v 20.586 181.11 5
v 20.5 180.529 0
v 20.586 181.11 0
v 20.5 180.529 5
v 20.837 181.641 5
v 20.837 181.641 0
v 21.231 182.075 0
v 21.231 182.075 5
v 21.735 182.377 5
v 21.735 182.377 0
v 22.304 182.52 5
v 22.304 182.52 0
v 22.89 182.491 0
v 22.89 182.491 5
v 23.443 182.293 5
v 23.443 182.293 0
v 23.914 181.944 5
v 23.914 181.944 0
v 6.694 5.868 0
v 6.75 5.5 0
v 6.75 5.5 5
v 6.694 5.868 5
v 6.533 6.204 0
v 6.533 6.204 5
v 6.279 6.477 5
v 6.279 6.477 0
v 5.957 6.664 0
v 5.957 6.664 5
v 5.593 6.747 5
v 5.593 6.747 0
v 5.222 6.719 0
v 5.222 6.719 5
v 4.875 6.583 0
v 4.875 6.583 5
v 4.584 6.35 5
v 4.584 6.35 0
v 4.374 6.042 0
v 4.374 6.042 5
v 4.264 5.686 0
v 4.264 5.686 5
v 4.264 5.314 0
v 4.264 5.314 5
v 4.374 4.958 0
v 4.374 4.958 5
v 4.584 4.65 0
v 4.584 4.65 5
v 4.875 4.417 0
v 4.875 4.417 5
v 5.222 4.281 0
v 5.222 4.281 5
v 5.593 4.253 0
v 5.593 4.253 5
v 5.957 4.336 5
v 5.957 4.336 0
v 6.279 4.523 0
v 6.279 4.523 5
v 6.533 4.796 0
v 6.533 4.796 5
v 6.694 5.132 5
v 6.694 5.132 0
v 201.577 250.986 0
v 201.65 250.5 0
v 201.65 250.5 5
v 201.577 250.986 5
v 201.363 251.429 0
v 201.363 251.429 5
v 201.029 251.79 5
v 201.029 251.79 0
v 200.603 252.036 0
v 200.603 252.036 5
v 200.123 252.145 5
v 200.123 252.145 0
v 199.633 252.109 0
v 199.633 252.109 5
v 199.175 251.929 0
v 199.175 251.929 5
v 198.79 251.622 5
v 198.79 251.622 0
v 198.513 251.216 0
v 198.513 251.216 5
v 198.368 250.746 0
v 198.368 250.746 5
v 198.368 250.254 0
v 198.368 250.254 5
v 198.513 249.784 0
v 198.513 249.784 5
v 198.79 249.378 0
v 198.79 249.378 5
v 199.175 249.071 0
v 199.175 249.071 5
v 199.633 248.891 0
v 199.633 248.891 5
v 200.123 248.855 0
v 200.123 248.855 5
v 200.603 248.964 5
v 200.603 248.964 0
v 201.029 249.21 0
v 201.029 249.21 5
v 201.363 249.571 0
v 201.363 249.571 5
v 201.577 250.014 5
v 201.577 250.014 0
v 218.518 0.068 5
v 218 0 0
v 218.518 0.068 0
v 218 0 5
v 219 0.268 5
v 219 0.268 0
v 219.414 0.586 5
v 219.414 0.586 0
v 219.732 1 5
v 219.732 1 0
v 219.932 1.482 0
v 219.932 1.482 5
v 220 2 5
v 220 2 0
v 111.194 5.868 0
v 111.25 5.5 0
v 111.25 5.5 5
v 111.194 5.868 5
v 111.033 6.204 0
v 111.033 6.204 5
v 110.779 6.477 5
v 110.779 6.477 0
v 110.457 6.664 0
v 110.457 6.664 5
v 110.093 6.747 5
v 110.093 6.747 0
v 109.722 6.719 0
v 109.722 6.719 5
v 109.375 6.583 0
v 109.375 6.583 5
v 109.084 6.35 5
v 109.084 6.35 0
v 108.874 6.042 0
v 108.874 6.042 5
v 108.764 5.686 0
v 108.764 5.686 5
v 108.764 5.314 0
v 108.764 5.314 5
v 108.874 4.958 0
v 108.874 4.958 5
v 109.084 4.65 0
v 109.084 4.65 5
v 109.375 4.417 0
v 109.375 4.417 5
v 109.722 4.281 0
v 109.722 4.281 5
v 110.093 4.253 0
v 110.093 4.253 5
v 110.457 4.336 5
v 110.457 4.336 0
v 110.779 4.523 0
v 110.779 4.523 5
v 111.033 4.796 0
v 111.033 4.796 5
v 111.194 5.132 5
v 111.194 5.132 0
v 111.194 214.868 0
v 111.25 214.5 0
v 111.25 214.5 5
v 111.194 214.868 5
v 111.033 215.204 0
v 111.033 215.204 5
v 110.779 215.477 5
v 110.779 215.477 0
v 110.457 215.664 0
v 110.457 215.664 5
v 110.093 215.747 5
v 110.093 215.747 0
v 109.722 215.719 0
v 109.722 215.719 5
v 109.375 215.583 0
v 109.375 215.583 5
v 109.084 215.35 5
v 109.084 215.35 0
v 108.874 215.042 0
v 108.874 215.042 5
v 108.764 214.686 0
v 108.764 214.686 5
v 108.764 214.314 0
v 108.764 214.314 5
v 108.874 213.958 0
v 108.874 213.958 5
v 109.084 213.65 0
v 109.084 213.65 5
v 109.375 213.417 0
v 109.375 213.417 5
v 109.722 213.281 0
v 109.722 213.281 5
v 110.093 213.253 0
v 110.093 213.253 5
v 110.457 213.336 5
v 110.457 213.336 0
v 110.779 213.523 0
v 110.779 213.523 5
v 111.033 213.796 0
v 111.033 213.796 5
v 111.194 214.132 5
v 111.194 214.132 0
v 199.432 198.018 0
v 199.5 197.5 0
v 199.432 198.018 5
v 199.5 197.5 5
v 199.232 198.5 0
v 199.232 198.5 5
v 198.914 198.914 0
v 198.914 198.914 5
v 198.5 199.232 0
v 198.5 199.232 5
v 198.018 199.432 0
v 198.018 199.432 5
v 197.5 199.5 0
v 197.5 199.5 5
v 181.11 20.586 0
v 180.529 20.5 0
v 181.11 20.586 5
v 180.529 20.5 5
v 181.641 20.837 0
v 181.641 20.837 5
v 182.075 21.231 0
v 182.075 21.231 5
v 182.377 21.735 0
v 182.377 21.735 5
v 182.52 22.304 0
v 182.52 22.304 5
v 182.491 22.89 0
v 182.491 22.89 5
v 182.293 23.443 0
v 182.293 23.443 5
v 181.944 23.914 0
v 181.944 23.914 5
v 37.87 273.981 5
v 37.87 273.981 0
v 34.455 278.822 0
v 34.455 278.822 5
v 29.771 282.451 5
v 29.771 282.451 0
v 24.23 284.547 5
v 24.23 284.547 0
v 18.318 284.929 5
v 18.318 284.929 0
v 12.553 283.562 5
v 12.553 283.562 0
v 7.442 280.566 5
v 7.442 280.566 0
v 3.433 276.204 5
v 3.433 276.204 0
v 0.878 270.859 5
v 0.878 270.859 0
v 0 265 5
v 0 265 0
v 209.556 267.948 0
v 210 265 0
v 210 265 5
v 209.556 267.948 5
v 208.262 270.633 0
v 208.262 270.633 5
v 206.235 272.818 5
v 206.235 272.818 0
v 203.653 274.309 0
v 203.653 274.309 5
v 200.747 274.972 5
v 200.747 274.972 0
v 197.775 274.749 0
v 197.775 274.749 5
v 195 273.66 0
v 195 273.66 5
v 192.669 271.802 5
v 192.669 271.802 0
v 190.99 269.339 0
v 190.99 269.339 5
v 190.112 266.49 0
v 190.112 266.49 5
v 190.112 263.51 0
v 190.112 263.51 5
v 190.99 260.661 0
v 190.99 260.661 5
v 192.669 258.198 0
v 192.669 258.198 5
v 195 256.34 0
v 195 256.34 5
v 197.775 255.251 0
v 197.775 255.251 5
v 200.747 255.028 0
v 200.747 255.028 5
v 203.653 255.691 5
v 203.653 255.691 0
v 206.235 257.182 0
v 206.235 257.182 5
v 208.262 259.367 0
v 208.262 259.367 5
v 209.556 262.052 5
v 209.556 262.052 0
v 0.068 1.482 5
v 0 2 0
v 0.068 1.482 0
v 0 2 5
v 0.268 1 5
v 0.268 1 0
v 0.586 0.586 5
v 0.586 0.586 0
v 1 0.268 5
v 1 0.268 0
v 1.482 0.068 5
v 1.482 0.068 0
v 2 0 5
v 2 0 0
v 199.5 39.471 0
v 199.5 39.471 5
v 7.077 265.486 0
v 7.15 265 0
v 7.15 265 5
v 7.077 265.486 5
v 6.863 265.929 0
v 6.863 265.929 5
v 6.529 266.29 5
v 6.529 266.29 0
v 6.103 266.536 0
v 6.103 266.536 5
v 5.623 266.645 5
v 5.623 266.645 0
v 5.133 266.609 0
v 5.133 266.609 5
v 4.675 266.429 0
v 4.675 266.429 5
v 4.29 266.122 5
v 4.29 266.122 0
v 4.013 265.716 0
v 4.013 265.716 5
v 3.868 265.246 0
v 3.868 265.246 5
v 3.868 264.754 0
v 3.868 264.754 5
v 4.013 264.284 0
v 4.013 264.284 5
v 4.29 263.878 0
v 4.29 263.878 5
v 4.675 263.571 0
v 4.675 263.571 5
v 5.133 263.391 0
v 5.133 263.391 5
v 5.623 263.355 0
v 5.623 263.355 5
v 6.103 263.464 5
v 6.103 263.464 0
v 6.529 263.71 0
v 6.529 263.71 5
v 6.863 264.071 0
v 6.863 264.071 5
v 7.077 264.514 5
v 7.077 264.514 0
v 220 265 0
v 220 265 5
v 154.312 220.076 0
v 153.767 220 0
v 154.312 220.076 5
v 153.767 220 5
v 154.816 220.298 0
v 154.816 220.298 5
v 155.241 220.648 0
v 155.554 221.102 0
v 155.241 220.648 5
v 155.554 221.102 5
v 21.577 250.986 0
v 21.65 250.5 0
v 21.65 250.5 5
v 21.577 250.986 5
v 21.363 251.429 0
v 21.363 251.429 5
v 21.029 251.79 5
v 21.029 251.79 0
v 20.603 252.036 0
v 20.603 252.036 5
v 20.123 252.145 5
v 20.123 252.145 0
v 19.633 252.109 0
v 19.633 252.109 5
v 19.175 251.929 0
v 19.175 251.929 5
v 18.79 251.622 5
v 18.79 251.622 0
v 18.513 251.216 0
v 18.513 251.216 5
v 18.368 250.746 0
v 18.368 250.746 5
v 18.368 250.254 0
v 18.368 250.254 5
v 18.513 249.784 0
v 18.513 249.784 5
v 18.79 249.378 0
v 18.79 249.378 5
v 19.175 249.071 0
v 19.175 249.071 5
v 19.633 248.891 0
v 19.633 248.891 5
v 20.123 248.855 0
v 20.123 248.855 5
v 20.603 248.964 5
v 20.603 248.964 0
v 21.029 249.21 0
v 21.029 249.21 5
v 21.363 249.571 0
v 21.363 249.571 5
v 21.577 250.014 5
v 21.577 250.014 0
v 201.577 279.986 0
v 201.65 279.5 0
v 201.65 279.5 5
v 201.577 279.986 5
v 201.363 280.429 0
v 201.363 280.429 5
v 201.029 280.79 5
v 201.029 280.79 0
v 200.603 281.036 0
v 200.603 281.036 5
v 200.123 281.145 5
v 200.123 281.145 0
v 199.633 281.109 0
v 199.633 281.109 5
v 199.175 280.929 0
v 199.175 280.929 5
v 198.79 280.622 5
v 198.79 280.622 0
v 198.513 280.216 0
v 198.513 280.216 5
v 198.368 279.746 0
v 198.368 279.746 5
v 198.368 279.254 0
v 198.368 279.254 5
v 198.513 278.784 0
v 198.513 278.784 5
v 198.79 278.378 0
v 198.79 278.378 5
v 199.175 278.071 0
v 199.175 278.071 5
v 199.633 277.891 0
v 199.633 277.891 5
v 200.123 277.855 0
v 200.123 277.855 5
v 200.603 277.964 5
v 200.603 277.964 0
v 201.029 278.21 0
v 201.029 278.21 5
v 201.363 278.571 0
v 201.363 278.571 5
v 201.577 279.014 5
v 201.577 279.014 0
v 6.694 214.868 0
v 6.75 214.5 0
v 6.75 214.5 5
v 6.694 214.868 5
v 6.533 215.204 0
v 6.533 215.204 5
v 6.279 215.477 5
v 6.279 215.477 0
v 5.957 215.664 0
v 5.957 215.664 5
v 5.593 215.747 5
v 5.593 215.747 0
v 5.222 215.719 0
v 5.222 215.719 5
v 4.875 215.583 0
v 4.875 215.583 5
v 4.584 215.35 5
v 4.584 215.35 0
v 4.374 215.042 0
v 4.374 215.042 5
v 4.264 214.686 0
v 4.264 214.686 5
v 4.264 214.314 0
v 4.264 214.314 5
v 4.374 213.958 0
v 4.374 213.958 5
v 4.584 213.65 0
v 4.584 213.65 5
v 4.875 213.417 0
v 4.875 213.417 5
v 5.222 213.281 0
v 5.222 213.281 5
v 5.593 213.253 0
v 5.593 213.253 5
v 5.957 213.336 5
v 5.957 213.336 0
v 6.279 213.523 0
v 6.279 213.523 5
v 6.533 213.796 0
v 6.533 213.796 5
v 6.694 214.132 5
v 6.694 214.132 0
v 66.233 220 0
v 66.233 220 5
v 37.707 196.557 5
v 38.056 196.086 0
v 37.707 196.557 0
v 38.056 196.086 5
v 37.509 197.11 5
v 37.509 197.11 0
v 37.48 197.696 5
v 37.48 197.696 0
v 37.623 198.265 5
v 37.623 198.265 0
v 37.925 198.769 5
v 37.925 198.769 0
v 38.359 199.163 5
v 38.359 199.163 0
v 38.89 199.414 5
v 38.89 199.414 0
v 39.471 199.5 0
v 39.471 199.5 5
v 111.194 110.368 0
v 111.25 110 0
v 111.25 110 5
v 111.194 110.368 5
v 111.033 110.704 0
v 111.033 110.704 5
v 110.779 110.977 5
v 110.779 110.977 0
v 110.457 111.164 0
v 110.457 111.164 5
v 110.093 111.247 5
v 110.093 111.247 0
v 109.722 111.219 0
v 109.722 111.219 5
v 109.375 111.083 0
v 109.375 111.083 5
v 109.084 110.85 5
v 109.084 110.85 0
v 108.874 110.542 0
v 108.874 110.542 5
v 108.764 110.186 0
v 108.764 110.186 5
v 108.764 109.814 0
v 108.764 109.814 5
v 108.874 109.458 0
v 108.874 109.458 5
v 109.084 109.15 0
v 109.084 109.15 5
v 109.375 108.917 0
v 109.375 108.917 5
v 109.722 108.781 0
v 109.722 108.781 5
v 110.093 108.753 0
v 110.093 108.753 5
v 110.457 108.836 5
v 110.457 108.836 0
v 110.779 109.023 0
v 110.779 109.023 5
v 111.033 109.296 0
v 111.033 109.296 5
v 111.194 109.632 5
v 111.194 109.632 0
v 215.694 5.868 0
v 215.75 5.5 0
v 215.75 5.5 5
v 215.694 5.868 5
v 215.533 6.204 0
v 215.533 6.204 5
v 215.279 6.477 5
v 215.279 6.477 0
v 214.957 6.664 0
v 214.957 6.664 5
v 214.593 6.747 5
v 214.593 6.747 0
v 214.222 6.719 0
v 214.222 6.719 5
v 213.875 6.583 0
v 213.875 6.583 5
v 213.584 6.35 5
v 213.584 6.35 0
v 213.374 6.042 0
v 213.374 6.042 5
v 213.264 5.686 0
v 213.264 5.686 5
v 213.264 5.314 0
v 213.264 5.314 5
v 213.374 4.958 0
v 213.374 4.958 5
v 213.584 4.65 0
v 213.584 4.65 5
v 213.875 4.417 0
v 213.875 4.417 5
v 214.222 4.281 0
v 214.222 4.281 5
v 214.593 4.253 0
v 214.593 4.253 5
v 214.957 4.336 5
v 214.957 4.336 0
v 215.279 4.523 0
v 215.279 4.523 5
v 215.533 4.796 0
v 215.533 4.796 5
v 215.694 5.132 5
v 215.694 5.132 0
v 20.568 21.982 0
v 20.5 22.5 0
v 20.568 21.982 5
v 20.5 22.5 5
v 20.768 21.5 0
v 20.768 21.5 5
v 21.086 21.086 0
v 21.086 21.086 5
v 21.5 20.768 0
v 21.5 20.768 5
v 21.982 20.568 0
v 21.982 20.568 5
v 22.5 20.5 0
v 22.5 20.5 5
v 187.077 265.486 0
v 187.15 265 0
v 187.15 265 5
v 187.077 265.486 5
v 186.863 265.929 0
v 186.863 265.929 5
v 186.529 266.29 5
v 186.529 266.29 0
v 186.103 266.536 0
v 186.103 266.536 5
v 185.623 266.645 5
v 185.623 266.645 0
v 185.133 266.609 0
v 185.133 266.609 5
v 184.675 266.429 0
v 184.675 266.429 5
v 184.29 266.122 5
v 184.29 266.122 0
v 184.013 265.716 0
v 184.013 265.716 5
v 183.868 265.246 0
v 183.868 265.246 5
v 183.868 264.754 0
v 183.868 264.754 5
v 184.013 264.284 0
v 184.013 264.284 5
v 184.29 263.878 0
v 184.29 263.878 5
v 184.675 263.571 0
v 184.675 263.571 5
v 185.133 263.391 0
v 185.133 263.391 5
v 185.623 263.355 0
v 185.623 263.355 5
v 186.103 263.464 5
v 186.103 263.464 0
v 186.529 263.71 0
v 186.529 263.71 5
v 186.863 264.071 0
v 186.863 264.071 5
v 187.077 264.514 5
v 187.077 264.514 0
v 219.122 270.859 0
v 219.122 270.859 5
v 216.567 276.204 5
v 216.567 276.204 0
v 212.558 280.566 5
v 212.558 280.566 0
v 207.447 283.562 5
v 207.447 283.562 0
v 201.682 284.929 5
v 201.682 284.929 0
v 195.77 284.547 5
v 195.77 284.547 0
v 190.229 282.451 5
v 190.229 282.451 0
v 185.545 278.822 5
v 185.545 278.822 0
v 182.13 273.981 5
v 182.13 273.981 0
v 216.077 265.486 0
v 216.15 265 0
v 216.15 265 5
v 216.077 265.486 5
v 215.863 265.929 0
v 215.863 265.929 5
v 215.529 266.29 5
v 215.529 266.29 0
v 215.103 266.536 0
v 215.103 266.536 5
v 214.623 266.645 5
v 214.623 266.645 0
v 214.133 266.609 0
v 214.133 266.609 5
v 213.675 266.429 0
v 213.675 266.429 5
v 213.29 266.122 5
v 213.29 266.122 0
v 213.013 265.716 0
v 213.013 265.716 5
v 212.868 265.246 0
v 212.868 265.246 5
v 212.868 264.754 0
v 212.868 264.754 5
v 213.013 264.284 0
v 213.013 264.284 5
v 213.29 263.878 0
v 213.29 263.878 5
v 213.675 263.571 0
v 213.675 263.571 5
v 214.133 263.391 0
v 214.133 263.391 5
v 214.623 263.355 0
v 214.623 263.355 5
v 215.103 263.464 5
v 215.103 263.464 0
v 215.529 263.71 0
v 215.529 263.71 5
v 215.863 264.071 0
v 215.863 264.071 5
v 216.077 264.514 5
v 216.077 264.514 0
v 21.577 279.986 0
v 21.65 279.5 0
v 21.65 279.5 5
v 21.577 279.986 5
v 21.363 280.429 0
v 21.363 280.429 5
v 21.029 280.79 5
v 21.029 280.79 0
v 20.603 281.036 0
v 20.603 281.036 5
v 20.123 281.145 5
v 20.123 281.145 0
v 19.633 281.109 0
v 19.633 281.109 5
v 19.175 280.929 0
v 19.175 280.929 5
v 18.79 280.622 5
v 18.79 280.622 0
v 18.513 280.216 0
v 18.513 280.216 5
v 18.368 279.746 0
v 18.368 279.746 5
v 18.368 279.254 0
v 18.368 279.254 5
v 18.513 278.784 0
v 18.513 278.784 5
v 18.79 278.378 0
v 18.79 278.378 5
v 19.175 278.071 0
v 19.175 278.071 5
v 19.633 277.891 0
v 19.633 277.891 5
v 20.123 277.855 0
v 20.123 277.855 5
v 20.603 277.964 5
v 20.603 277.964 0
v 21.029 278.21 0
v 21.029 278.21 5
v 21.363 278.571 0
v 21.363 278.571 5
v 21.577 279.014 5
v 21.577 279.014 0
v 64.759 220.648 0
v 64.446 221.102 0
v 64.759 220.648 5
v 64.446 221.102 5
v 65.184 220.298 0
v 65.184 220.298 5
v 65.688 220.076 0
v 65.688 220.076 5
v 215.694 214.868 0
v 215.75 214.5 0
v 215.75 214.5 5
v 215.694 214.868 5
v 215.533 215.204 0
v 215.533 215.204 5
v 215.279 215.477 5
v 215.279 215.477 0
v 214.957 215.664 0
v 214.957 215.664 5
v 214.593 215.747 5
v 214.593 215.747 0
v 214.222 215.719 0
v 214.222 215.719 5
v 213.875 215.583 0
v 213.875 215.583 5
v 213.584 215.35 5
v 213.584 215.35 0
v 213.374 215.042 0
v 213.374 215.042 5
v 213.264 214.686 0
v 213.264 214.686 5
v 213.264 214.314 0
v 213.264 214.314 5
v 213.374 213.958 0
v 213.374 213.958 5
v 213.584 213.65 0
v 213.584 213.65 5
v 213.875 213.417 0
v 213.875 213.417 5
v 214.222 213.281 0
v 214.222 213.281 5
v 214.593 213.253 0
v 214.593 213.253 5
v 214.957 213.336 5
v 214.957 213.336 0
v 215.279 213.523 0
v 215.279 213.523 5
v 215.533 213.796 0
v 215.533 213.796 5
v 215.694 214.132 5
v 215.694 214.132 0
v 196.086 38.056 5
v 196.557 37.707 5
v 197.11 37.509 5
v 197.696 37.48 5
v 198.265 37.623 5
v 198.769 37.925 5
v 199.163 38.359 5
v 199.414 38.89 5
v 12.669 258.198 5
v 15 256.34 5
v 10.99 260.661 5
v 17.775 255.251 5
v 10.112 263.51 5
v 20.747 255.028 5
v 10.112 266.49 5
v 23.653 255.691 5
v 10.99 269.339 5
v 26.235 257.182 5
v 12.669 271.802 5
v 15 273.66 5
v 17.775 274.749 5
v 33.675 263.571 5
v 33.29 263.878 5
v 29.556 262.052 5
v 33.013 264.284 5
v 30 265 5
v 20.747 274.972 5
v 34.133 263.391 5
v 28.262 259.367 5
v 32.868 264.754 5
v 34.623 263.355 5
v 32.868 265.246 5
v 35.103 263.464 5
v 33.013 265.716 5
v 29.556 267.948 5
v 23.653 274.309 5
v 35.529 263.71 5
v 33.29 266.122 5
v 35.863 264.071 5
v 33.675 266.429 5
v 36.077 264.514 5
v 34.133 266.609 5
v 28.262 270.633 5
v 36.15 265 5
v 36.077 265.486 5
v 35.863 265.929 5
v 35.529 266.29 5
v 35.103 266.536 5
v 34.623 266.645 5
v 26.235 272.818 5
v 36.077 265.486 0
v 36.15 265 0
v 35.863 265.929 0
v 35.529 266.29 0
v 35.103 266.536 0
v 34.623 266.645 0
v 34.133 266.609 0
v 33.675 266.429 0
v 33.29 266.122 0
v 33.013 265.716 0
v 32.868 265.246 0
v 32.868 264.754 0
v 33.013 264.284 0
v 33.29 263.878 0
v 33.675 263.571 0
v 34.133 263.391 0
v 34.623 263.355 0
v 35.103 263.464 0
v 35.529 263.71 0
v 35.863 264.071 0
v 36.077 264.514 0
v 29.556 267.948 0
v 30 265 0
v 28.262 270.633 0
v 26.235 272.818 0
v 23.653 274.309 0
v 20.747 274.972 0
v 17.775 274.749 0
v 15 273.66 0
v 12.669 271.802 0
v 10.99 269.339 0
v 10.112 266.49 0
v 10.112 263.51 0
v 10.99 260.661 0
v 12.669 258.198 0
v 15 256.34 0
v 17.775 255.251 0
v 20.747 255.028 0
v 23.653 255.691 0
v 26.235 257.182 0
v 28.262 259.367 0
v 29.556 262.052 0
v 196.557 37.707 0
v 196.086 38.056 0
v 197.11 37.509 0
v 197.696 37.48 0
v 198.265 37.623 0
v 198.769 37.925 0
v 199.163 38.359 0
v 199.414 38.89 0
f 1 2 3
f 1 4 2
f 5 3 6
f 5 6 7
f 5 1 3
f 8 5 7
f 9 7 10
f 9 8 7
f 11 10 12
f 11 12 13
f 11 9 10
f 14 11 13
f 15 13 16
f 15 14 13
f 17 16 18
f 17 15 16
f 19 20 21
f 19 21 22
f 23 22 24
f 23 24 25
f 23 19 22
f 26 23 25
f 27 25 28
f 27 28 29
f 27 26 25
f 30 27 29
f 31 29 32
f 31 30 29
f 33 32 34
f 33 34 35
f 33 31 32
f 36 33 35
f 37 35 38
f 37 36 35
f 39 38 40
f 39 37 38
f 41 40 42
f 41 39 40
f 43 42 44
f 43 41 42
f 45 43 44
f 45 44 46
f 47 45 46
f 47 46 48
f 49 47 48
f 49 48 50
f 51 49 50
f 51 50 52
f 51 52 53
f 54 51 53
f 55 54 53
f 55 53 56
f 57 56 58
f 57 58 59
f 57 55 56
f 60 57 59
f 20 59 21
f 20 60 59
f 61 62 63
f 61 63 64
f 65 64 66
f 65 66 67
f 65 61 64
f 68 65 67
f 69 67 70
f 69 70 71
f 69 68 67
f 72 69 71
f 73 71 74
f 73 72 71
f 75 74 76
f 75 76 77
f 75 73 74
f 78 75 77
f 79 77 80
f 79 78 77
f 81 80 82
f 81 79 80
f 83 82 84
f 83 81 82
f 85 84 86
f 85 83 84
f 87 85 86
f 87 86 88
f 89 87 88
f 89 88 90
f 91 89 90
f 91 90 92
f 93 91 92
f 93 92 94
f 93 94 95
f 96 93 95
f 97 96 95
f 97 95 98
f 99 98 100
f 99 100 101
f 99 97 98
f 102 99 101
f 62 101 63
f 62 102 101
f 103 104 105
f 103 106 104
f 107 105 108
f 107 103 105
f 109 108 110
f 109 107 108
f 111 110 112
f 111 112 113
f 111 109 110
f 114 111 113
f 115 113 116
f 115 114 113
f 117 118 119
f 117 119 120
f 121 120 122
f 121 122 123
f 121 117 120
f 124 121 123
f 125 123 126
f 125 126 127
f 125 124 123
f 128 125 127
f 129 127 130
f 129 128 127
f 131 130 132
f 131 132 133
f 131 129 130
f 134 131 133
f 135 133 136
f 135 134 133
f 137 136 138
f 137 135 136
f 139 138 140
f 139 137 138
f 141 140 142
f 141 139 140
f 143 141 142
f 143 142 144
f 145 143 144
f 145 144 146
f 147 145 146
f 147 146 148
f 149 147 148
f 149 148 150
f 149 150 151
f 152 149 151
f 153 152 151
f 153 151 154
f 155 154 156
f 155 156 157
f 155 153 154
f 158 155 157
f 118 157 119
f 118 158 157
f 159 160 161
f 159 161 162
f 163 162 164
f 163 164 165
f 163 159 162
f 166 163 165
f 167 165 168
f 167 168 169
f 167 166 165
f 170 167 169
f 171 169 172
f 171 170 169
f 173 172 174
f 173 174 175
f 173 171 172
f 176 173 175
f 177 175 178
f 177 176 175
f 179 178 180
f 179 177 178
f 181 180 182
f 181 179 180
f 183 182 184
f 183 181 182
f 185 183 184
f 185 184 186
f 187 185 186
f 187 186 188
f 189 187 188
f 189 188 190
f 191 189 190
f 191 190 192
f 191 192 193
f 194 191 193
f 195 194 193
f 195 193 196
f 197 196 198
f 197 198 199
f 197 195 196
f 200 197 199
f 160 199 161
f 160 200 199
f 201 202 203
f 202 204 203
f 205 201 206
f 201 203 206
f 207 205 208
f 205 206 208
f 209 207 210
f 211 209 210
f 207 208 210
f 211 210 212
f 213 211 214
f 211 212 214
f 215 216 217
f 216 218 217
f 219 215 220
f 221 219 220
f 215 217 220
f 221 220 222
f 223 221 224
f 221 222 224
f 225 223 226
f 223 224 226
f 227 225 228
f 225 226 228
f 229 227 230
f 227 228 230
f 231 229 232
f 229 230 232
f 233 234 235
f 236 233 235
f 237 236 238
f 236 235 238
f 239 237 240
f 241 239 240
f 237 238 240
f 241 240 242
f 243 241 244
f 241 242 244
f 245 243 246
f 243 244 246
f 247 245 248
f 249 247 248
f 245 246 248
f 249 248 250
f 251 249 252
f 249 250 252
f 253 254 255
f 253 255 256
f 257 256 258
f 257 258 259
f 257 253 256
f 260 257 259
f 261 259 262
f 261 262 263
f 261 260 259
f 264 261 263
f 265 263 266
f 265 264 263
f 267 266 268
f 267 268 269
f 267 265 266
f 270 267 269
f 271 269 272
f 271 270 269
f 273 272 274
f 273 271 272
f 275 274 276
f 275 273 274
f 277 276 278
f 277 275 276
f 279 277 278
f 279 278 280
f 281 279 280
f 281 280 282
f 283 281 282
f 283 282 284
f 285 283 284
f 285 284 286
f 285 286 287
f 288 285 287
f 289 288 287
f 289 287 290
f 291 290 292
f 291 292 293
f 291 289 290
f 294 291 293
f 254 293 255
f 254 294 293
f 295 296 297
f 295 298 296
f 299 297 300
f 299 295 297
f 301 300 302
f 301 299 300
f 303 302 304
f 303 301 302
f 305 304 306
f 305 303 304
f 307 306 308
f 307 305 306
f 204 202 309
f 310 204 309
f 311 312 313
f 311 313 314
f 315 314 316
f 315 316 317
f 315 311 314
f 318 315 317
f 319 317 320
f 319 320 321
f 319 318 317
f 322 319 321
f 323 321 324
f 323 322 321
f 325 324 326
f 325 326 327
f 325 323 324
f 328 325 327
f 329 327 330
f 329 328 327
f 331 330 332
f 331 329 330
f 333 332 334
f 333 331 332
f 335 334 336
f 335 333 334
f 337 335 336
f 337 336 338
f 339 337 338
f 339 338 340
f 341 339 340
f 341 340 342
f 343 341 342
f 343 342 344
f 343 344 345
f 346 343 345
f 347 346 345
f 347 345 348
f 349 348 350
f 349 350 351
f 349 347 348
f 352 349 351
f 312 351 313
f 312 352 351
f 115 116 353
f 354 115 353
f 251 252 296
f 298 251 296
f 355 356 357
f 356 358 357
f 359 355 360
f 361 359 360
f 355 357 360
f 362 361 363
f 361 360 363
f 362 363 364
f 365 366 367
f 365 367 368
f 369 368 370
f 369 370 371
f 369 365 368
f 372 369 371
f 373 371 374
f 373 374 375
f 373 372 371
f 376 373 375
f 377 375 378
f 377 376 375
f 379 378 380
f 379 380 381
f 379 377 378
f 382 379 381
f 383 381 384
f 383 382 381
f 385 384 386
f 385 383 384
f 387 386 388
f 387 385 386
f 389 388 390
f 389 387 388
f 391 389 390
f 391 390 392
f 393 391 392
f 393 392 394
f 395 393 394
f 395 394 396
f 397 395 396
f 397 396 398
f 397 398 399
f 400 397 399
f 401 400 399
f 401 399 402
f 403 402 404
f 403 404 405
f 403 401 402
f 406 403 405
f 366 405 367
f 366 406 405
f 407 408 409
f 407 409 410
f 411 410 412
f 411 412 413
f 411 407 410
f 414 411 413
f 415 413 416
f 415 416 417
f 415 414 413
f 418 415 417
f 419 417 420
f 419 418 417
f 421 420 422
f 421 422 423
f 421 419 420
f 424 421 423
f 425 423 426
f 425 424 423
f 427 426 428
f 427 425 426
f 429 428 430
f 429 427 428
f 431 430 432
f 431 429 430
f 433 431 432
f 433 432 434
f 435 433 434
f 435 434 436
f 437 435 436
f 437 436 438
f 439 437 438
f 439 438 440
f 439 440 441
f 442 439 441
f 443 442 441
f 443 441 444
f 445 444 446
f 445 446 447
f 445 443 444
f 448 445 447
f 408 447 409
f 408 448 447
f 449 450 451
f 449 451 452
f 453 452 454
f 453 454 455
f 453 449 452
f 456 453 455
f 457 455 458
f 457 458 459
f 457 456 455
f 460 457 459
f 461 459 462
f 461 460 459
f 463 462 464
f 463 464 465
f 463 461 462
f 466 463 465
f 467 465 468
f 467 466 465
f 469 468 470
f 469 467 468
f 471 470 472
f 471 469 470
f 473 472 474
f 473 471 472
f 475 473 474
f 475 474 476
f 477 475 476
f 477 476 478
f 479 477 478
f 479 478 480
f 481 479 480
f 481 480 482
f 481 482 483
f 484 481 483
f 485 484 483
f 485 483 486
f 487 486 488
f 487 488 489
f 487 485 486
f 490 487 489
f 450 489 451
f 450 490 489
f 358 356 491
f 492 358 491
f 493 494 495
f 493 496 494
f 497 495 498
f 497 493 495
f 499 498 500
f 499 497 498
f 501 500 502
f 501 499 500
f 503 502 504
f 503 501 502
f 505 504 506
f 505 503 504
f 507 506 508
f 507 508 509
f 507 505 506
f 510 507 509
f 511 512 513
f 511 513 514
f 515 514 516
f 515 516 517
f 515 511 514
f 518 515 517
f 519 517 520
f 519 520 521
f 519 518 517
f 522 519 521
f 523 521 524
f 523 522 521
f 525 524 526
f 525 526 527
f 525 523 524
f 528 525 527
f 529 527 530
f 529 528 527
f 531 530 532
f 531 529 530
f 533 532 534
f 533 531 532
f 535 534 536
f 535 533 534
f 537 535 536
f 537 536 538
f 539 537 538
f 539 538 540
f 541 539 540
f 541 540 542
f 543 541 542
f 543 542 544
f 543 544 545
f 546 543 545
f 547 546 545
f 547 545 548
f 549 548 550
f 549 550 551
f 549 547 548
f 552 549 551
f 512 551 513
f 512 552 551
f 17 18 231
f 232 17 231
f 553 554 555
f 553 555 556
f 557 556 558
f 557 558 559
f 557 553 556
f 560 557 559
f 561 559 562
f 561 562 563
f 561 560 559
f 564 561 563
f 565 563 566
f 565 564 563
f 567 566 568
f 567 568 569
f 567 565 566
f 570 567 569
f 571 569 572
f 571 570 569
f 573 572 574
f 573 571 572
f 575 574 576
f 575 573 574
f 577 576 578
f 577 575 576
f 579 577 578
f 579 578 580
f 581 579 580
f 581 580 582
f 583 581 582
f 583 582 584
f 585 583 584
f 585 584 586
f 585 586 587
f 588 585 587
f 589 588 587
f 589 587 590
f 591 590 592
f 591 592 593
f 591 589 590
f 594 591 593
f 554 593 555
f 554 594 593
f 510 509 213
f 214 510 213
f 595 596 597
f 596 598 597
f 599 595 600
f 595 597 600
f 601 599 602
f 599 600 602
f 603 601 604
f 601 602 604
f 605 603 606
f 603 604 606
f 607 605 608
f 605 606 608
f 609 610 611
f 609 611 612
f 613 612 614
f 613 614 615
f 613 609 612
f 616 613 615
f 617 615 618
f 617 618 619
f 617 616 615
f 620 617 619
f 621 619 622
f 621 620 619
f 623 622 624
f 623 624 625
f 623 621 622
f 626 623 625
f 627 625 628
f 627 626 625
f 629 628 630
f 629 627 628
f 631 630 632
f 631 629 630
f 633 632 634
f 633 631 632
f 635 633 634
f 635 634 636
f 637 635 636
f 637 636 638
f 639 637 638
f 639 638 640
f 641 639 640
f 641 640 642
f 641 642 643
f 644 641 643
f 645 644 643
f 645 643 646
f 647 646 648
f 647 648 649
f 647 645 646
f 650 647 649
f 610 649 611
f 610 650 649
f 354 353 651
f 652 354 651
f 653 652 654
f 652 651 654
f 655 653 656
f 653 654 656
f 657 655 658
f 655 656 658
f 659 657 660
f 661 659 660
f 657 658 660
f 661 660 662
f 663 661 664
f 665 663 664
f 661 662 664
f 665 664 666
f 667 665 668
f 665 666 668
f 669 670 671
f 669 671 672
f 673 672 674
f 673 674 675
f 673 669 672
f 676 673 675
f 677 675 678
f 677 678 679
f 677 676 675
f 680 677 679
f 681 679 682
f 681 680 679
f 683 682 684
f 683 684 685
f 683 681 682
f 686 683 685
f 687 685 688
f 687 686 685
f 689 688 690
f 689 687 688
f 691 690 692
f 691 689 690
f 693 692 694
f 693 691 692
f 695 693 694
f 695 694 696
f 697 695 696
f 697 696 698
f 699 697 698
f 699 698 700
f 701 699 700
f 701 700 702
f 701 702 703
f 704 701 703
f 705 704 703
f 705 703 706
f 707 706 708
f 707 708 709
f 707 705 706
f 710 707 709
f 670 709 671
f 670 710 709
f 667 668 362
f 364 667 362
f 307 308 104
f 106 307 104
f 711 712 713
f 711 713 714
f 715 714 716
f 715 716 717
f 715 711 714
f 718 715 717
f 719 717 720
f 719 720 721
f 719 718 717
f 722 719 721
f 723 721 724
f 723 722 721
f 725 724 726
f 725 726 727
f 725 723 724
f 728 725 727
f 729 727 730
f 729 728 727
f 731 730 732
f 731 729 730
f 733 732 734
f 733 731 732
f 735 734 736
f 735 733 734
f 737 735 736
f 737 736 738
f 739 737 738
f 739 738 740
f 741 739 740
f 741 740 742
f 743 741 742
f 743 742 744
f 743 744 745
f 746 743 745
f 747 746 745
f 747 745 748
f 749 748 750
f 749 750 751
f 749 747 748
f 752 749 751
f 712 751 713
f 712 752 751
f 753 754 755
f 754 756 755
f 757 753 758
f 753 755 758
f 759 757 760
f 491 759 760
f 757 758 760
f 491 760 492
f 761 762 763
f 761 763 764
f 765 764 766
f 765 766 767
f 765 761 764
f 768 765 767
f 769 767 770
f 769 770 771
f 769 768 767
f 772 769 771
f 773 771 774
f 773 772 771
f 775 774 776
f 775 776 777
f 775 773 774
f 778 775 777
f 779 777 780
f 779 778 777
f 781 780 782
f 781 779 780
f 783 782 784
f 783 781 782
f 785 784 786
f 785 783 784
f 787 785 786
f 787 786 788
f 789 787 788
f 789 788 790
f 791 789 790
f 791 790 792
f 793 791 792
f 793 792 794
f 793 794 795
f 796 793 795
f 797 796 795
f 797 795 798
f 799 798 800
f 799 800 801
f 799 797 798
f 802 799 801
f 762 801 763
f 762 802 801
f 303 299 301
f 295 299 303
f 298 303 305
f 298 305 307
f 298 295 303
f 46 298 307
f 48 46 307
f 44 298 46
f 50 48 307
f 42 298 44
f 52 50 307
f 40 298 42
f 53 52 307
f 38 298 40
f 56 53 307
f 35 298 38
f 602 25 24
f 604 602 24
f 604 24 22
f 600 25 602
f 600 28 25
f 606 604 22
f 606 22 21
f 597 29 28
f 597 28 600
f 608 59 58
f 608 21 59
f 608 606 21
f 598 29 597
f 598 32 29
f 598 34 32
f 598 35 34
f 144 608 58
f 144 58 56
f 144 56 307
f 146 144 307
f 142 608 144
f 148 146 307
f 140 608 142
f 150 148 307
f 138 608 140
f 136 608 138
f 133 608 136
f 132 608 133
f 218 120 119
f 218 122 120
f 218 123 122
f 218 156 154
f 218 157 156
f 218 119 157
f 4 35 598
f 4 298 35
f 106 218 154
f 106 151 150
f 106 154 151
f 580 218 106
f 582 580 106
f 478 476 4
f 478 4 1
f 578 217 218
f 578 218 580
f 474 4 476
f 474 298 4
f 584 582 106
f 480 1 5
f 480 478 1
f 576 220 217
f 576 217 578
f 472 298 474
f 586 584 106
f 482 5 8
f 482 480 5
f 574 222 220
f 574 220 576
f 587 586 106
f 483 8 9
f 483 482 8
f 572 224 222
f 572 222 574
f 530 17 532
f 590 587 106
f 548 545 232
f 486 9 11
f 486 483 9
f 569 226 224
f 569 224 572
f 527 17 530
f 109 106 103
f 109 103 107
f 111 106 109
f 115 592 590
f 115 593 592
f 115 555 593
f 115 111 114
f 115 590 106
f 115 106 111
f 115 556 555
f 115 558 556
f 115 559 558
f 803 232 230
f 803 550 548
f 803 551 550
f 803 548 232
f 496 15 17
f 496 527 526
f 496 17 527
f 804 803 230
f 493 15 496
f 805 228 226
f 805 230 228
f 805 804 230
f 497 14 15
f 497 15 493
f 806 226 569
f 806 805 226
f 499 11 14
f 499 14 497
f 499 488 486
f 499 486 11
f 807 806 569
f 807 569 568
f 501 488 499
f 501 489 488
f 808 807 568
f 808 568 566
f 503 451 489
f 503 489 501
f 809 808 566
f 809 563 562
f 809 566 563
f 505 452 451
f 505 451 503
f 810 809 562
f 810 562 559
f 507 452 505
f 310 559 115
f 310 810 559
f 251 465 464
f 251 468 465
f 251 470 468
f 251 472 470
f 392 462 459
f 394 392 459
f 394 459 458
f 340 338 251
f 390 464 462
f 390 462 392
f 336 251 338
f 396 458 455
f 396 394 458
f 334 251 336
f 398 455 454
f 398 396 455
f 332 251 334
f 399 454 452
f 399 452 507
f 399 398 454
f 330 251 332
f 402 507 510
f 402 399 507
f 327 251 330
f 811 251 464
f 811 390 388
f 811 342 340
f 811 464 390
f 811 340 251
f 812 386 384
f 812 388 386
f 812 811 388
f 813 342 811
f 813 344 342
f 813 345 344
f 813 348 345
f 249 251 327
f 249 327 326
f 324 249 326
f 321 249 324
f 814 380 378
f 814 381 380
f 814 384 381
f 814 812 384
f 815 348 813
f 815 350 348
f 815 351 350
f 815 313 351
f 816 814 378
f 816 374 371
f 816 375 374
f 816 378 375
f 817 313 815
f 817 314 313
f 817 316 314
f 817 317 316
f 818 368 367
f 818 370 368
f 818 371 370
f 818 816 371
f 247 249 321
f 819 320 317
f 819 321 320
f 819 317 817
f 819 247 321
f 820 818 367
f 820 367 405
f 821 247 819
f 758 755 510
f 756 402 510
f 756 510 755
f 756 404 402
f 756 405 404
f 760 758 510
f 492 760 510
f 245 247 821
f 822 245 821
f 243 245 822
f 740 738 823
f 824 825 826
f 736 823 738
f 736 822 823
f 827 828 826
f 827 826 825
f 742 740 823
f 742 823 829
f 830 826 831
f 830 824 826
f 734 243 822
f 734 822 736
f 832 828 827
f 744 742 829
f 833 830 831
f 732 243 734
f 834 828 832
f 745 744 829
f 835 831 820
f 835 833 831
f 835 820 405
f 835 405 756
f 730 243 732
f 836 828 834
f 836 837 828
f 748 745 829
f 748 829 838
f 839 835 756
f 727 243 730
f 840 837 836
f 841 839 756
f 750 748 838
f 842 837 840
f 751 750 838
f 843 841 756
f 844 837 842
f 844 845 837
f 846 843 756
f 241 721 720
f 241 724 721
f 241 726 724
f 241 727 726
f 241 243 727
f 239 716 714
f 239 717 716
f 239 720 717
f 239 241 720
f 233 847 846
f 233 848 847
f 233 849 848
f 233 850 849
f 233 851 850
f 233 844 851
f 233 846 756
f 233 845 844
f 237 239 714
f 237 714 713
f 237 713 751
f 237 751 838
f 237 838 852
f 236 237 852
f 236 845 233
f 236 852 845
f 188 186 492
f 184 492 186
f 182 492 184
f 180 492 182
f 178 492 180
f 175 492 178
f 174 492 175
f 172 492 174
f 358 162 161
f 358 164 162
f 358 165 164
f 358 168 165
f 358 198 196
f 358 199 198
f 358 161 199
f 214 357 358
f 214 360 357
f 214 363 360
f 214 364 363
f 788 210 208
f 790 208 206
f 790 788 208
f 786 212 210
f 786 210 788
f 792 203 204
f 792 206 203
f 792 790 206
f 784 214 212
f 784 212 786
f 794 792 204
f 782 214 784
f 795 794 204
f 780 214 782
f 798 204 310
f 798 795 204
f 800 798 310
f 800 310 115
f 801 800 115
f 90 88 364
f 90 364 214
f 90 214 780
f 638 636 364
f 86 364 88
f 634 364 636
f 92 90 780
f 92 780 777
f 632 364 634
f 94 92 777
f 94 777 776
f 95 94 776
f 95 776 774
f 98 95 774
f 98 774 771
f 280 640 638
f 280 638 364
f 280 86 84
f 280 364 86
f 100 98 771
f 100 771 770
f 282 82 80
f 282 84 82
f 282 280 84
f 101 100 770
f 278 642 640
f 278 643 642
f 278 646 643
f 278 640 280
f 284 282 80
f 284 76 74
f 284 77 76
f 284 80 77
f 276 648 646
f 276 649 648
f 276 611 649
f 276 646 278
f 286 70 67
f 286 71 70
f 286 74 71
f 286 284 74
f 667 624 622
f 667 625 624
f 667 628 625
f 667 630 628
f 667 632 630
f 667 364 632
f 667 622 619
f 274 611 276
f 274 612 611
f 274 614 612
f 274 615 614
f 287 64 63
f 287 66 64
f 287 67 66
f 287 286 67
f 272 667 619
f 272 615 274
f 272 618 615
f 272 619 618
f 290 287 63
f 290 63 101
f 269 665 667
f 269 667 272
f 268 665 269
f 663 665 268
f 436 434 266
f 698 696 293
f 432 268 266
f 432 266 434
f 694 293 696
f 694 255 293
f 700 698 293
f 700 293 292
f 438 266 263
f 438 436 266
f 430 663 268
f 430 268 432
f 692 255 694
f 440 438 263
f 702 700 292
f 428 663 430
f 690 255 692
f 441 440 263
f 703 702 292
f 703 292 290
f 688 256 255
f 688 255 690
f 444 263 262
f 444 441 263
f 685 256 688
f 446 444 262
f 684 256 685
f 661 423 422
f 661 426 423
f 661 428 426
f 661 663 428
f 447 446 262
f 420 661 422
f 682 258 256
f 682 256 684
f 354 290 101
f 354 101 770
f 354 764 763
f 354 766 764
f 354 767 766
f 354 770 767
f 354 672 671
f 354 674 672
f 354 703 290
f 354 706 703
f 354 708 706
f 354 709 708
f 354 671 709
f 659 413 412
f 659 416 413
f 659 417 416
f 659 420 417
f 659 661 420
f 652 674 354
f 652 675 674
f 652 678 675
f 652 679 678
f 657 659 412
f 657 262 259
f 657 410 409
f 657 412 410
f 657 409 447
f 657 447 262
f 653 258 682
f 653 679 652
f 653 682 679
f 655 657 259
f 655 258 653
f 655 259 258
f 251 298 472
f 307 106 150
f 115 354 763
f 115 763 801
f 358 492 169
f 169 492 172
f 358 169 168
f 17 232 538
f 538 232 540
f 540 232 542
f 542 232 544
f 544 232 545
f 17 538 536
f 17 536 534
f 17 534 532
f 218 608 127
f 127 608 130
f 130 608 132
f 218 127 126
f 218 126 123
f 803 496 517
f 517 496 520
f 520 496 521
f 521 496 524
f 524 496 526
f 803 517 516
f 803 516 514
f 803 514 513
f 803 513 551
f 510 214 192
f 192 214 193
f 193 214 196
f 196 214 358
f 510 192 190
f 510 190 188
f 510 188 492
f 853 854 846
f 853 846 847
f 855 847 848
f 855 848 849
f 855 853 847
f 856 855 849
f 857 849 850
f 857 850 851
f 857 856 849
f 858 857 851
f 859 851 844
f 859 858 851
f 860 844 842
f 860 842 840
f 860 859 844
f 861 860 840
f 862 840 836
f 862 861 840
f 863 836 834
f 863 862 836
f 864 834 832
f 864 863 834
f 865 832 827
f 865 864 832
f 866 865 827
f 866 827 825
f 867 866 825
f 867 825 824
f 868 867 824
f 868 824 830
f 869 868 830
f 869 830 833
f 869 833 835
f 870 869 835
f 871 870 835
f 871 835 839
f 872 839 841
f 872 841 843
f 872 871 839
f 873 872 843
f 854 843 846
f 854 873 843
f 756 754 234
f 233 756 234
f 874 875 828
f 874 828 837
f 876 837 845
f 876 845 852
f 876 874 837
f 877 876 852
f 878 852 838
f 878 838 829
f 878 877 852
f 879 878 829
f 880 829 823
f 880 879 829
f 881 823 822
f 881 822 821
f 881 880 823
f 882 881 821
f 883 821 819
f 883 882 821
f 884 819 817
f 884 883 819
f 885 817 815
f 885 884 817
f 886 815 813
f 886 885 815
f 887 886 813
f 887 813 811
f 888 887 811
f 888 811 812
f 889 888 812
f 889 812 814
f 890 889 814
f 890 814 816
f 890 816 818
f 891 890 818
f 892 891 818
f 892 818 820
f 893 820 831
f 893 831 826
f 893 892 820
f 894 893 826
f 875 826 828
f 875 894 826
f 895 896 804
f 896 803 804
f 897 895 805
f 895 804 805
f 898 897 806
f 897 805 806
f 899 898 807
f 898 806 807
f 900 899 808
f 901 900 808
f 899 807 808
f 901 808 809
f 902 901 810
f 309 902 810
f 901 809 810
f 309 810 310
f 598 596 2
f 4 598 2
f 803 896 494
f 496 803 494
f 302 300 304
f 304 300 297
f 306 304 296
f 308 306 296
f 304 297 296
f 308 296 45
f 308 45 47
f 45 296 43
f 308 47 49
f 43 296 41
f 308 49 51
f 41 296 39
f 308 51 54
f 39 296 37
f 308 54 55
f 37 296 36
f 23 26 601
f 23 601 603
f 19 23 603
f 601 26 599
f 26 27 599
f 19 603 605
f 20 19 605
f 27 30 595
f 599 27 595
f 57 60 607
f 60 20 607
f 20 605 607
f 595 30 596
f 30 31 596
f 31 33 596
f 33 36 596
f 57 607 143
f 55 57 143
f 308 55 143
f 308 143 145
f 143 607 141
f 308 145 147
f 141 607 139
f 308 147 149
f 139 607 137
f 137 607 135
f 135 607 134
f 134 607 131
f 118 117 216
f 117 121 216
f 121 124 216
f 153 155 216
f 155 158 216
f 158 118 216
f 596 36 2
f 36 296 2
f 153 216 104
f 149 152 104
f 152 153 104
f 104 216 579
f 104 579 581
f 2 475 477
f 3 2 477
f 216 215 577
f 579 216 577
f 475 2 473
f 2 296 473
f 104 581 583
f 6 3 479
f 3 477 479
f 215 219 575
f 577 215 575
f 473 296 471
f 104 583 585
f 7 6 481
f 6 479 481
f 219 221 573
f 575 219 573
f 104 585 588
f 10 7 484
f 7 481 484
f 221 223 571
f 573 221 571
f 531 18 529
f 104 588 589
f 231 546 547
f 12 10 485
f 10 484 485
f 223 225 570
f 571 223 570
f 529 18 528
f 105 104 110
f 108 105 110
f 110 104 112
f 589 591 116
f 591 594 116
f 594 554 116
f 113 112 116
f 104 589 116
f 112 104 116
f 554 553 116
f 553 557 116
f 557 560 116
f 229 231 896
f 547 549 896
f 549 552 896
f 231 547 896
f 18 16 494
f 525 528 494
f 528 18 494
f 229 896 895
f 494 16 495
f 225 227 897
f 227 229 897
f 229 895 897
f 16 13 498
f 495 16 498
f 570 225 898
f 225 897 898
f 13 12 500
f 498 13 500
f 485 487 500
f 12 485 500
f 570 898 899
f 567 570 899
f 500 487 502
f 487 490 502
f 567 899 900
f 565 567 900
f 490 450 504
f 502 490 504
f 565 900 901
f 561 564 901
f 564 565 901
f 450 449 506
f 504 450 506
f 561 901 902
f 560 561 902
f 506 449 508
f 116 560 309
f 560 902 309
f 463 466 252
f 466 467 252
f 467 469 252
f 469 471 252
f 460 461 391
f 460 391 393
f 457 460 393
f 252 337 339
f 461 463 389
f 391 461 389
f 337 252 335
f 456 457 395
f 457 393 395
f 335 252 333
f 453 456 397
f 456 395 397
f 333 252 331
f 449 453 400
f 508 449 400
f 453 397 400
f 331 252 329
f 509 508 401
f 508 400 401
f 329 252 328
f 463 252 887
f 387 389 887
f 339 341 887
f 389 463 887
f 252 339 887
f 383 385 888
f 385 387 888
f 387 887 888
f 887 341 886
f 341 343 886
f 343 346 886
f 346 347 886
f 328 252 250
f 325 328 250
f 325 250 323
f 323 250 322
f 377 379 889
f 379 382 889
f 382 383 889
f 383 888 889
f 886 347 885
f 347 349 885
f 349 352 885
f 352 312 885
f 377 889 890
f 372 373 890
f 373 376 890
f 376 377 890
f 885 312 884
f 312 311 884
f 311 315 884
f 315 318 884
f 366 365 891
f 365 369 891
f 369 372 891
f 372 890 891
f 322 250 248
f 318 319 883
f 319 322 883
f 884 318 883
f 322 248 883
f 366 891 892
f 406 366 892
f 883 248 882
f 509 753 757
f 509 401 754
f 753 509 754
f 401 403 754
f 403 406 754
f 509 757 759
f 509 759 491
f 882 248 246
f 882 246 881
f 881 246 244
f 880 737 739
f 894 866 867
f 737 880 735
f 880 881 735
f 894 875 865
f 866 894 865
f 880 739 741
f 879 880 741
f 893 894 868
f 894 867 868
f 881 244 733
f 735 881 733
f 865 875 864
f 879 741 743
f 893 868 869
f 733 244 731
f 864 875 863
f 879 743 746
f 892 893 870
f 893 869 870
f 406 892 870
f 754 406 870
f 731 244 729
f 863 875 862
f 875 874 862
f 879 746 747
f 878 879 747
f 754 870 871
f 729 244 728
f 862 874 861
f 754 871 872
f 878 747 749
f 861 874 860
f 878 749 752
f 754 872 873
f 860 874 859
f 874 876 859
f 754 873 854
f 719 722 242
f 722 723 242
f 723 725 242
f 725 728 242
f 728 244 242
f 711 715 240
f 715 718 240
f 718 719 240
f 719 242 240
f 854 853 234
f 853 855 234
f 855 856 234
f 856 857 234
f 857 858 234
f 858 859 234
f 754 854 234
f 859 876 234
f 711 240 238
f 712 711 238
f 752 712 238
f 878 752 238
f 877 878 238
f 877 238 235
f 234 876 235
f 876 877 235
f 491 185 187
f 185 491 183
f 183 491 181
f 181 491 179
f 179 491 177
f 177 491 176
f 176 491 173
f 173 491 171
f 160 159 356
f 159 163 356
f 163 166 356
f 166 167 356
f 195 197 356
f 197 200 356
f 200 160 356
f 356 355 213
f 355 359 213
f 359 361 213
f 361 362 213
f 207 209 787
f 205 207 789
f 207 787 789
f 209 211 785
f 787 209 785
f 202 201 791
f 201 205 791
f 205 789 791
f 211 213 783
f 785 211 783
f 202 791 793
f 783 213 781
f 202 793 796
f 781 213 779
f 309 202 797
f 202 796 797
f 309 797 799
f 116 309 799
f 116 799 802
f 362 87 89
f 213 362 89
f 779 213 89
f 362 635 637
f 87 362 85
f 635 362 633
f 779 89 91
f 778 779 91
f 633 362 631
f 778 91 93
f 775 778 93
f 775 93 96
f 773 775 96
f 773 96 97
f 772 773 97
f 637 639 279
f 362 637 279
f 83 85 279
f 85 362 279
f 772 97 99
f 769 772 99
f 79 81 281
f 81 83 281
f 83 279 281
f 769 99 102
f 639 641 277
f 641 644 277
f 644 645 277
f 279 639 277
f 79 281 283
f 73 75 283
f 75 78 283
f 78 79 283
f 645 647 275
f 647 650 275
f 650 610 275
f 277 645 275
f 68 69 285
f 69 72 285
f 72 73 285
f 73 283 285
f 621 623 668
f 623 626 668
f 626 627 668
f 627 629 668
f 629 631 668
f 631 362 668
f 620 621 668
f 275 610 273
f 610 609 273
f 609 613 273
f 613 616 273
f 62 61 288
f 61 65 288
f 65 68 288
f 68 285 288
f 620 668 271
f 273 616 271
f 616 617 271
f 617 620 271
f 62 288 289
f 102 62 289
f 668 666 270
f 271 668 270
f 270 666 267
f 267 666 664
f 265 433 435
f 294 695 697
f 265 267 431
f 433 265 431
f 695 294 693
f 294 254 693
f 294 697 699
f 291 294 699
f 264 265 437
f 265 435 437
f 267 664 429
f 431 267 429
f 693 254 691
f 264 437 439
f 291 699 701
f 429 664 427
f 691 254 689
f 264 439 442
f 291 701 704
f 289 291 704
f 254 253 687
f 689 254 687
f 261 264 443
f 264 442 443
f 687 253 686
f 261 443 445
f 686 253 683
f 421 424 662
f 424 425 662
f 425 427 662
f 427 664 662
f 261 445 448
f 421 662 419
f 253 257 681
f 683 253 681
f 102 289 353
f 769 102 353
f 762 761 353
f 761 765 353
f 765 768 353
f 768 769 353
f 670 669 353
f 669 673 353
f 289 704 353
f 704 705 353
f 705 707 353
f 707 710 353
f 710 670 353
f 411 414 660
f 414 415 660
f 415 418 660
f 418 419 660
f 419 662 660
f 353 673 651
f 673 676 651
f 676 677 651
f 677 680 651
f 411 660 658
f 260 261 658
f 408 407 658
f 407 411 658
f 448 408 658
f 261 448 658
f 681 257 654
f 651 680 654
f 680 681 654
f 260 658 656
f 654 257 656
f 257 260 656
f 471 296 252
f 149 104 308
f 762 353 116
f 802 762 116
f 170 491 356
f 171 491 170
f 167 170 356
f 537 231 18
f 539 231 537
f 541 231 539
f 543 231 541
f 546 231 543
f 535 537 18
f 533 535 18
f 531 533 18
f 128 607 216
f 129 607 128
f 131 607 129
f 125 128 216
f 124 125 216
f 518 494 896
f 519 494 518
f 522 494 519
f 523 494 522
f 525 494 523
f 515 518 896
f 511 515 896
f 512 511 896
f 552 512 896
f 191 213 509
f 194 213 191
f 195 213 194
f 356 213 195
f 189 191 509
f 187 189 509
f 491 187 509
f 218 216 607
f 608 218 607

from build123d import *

# Parameters (mm, degrees)
F0_R     = 1.25
F0_R_2   = 1.65
F0_R_3   = 10
F1_DEPTH = 5
F2_R     = 2


with BuildPart() as f1:
    # F0 (on Top) → F1 (new body)
    with BuildSketch(Plane.XY):
        with BuildLine():
            Line((0, 265), (0, 0))
            Line((0, 0), (220, 0))
            Line((220, 0), (220, 265))
            ThreePointArc((220, 265), (204.615137, 284.460229), (182.129949, 273.981162))
            Line((182.129949, 273.981162), (155, 220))
            Line((155, 220), (65, 220))
            Line((65, 220), (37.870051, 273.981162))
            ThreePointArc((37.870051, 273.981162), (15.384863, 284.460229), (0, 265))
        make_face()
        with Locations((5.5, 5.5)):
            Circle(F0_R, mode=Mode.SUBTRACT)
        Polygon((20.5, 185.357864), (185.357864, 20.5), (20.5, 20.5), align=None, mode=Mode.SUBTRACT)
        with Locations((110, 5.5)):
            Circle(F0_R, mode=Mode.SUBTRACT)
        with Locations((214.5, 5.5)):
            Circle(F0_R, mode=Mode.SUBTRACT)
        with Locations((110, 110)):
            Circle(F0_R, mode=Mode.SUBTRACT)
        Polygon((34.642136, 199.5), (199.5, 199.5), (199.5, 34.642136), align=None, mode=Mode.SUBTRACT)
        with Locations((5.5, 214.5)):
            Circle(F0_R, mode=Mode.SUBTRACT)
        with Locations((5.5, 265)):
            Circle(F0_R_2, mode=Mode.SUBTRACT)
        with Locations((20, 250.5)):
            Circle(F0_R_2, mode=Mode.SUBTRACT)
        with Locations((20, 265)):
            Circle(F0_R_3, mode=Mode.SUBTRACT)
        with Locations((20, 279.5)):
            Circle(F0_R_2, mode=Mode.SUBTRACT)
        with Locations((34.5, 265)):
            Circle(F0_R_2, mode=Mode.SUBTRACT)
        with Locations((110, 214.5)):
            Circle(F0_R, mode=Mode.SUBTRACT)
        with Locations((214.5, 214.5)):
            Circle(F0_R, mode=Mode.SUBTRACT)
        with Locations((185.5, 265)):
            Circle(F0_R_2, mode=Mode.SUBTRACT)
        with Locations((200, 250.5)):
            Circle(F0_R_2, mode=Mode.SUBTRACT)
        with Locations((200, 265)):
            Circle(F0_R_3, mode=Mode.SUBTRACT)
        with Locations((214.5, 265)):
            Circle(F0_R_2, mode=Mode.SUBTRACT)
        with Locations((200, 279.5)):
            Circle(F0_R_2, mode=Mode.SUBTRACT)
    extrude(amount=F1_DEPTH)

    # F2
    f2_edges = [f1.edges().sort_by_distance(p)[0] for p in [
        (65, 220, 2.5),
        (155, 220, 2.5),
        (220, 0, 2.5),
        (0, 0, 2.5),
        (34.642136, 199.5, 2.5),
        (199.5, 199.5, 2.5),
        (199.5, 34.642136, 2.5),
        (20.5, 185.357864, 2.5),
        (185.357864, 20.5, 2.5),
        (20.5, 20.5, 2.5),
    ]]
    fillet(f2_edges, radius=F2_R)


solid = f1.part
